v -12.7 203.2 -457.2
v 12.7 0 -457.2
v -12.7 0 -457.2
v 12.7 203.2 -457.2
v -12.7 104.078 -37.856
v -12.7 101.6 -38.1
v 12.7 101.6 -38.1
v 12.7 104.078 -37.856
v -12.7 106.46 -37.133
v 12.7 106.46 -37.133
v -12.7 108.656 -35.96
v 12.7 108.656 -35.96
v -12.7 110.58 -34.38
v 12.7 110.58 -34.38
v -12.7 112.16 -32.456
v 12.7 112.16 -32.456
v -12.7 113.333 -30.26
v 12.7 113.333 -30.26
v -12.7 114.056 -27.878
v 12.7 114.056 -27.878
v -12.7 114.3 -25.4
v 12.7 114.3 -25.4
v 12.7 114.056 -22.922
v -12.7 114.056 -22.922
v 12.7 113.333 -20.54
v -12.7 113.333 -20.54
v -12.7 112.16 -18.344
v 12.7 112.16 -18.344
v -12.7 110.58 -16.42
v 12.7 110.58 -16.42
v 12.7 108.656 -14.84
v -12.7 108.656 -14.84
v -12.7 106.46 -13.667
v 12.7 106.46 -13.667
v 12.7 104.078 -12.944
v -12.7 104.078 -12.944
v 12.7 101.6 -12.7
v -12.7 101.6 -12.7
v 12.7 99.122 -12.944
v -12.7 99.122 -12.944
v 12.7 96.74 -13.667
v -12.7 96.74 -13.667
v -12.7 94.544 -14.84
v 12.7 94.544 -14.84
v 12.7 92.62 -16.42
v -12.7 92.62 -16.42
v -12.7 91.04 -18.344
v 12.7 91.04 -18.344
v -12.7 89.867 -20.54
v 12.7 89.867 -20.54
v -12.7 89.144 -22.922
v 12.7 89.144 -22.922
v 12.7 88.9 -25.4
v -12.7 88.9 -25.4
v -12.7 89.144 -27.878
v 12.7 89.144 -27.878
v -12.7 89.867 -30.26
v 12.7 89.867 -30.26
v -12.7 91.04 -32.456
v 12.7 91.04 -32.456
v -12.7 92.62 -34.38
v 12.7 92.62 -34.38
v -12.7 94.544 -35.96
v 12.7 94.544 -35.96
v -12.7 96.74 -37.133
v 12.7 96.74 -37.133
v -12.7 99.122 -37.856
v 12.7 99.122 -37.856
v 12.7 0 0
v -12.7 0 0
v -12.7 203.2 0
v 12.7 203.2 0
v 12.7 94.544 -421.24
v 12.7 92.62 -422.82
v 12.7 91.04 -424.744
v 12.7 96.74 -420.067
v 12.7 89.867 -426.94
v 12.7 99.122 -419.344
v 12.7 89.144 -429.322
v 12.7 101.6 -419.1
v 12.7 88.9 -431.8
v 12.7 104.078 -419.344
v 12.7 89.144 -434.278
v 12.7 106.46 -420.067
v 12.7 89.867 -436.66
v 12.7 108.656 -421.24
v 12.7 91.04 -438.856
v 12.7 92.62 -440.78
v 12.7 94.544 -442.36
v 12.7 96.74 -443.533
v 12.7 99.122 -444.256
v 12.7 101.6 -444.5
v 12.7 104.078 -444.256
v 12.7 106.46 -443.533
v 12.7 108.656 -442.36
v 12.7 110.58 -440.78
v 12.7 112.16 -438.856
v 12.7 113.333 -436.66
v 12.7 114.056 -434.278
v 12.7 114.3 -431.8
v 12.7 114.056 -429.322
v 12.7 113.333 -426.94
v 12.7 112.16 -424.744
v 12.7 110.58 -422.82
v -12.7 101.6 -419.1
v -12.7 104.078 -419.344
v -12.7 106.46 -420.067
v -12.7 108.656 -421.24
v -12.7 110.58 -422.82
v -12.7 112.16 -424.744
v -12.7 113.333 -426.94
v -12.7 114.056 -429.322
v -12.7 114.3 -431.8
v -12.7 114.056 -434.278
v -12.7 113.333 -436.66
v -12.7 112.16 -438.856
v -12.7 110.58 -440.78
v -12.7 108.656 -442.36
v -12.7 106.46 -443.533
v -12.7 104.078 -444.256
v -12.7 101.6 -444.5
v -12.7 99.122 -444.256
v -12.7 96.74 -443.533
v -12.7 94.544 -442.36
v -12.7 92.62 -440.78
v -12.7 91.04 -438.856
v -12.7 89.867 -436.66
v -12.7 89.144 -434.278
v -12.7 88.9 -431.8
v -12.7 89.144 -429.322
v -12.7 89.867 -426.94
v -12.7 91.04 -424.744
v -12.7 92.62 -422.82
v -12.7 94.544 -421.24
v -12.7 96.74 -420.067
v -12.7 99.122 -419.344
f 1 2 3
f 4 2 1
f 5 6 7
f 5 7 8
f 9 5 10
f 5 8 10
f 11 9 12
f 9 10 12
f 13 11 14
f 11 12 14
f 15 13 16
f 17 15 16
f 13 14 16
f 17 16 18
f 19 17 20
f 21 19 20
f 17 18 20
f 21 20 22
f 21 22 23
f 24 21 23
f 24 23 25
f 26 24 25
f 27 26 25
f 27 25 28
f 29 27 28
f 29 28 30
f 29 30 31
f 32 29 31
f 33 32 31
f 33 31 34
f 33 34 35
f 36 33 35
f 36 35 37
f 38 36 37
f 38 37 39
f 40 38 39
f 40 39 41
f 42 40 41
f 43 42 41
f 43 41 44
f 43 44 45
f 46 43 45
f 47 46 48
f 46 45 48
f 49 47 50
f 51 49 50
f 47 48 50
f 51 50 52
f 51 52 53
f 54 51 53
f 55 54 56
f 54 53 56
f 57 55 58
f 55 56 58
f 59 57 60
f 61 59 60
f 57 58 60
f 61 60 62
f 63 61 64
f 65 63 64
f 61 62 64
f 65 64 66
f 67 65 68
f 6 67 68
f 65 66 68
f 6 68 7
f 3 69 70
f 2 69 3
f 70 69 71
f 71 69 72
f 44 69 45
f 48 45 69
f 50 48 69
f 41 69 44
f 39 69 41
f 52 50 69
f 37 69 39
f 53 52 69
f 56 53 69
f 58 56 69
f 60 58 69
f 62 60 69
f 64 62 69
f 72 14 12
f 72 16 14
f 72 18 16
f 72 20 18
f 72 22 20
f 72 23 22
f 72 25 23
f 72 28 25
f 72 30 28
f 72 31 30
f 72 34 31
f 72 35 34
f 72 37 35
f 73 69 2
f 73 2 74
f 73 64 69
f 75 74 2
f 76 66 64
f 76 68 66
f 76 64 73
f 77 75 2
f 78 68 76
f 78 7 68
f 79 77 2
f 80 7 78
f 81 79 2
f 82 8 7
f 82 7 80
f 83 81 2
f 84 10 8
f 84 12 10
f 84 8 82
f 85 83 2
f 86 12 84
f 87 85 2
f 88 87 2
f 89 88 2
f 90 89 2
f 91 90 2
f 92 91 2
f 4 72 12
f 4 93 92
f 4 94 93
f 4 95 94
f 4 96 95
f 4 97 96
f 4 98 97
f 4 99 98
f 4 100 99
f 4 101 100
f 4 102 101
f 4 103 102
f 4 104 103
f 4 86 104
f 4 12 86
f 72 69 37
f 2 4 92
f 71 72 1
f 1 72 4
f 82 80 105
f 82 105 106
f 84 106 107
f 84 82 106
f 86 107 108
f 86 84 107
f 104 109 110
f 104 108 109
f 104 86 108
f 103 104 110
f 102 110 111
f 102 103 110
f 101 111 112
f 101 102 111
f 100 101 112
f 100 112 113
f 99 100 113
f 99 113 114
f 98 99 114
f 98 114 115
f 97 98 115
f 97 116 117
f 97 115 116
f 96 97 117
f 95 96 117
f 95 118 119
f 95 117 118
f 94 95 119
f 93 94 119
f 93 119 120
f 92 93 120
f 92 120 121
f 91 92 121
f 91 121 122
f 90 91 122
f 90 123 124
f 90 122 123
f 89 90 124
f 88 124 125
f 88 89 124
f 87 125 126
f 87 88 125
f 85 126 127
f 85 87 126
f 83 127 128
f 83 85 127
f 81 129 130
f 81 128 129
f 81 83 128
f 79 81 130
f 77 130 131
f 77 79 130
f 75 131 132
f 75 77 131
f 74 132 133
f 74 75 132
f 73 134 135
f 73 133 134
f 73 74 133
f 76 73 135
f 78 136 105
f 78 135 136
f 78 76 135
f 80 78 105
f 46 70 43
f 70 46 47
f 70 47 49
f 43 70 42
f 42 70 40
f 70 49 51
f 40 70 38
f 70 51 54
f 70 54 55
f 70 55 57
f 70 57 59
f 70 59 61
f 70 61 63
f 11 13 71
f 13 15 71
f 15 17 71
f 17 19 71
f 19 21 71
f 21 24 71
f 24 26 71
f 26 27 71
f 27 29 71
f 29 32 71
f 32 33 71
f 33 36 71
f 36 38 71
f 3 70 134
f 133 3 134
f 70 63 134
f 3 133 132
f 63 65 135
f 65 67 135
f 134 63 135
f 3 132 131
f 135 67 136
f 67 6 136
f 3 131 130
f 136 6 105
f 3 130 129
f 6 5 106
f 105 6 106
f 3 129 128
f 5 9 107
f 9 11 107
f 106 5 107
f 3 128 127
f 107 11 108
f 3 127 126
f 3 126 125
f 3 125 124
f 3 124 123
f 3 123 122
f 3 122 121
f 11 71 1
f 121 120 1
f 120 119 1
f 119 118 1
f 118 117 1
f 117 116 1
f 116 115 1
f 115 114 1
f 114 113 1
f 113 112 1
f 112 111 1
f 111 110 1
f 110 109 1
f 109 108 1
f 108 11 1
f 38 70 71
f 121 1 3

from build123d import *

# Parameters (mm, degrees)
SKETCH1_W           = 457.2
SKETCH1_H           = 203.2
BOSS_EXTRUDE1_DEPTH = 12.7
CUT_EXTRUDE1_START  = -26.4
SKETCH2_R           = 12.7
CUT_EXTRUDE1_DEPTH  = 27.4


with BuildPart() as part:
    # Sketch1 → Boss-Extrude1 (new body, symmetric)
    with BuildSketch(Plane(origin=(0, 0, 0), x_dir=(0, 0, -1), z_dir=(1, 0, 0))):
        with Locations((228.6, 101.6)):
            Rectangle(SKETCH1_W, SKETCH1_H)
    extrude(amount=BOSS_EXTRUDE1_DEPTH, both=True)

    # Sketch2 → Cut-Extrude1 (cut)
    with BuildSketch(Plane.ZY.offset(12.7).offset(CUT_EXTRUDE1_START)):
        with Locations((-431.8, 101.6)):
            Circle(SKETCH2_R)
    cut_extrude1 = extrude(amount=CUT_EXTRUDE1_DEPTH, mode=Mode.SUBTRACT)

    # Mirror3: Cut-Extrude1 across plane
    add(cut_extrude1.mirror(Plane.XY.offset(-228.6)), mode=Mode.SUBTRACT)


solid = part.part
